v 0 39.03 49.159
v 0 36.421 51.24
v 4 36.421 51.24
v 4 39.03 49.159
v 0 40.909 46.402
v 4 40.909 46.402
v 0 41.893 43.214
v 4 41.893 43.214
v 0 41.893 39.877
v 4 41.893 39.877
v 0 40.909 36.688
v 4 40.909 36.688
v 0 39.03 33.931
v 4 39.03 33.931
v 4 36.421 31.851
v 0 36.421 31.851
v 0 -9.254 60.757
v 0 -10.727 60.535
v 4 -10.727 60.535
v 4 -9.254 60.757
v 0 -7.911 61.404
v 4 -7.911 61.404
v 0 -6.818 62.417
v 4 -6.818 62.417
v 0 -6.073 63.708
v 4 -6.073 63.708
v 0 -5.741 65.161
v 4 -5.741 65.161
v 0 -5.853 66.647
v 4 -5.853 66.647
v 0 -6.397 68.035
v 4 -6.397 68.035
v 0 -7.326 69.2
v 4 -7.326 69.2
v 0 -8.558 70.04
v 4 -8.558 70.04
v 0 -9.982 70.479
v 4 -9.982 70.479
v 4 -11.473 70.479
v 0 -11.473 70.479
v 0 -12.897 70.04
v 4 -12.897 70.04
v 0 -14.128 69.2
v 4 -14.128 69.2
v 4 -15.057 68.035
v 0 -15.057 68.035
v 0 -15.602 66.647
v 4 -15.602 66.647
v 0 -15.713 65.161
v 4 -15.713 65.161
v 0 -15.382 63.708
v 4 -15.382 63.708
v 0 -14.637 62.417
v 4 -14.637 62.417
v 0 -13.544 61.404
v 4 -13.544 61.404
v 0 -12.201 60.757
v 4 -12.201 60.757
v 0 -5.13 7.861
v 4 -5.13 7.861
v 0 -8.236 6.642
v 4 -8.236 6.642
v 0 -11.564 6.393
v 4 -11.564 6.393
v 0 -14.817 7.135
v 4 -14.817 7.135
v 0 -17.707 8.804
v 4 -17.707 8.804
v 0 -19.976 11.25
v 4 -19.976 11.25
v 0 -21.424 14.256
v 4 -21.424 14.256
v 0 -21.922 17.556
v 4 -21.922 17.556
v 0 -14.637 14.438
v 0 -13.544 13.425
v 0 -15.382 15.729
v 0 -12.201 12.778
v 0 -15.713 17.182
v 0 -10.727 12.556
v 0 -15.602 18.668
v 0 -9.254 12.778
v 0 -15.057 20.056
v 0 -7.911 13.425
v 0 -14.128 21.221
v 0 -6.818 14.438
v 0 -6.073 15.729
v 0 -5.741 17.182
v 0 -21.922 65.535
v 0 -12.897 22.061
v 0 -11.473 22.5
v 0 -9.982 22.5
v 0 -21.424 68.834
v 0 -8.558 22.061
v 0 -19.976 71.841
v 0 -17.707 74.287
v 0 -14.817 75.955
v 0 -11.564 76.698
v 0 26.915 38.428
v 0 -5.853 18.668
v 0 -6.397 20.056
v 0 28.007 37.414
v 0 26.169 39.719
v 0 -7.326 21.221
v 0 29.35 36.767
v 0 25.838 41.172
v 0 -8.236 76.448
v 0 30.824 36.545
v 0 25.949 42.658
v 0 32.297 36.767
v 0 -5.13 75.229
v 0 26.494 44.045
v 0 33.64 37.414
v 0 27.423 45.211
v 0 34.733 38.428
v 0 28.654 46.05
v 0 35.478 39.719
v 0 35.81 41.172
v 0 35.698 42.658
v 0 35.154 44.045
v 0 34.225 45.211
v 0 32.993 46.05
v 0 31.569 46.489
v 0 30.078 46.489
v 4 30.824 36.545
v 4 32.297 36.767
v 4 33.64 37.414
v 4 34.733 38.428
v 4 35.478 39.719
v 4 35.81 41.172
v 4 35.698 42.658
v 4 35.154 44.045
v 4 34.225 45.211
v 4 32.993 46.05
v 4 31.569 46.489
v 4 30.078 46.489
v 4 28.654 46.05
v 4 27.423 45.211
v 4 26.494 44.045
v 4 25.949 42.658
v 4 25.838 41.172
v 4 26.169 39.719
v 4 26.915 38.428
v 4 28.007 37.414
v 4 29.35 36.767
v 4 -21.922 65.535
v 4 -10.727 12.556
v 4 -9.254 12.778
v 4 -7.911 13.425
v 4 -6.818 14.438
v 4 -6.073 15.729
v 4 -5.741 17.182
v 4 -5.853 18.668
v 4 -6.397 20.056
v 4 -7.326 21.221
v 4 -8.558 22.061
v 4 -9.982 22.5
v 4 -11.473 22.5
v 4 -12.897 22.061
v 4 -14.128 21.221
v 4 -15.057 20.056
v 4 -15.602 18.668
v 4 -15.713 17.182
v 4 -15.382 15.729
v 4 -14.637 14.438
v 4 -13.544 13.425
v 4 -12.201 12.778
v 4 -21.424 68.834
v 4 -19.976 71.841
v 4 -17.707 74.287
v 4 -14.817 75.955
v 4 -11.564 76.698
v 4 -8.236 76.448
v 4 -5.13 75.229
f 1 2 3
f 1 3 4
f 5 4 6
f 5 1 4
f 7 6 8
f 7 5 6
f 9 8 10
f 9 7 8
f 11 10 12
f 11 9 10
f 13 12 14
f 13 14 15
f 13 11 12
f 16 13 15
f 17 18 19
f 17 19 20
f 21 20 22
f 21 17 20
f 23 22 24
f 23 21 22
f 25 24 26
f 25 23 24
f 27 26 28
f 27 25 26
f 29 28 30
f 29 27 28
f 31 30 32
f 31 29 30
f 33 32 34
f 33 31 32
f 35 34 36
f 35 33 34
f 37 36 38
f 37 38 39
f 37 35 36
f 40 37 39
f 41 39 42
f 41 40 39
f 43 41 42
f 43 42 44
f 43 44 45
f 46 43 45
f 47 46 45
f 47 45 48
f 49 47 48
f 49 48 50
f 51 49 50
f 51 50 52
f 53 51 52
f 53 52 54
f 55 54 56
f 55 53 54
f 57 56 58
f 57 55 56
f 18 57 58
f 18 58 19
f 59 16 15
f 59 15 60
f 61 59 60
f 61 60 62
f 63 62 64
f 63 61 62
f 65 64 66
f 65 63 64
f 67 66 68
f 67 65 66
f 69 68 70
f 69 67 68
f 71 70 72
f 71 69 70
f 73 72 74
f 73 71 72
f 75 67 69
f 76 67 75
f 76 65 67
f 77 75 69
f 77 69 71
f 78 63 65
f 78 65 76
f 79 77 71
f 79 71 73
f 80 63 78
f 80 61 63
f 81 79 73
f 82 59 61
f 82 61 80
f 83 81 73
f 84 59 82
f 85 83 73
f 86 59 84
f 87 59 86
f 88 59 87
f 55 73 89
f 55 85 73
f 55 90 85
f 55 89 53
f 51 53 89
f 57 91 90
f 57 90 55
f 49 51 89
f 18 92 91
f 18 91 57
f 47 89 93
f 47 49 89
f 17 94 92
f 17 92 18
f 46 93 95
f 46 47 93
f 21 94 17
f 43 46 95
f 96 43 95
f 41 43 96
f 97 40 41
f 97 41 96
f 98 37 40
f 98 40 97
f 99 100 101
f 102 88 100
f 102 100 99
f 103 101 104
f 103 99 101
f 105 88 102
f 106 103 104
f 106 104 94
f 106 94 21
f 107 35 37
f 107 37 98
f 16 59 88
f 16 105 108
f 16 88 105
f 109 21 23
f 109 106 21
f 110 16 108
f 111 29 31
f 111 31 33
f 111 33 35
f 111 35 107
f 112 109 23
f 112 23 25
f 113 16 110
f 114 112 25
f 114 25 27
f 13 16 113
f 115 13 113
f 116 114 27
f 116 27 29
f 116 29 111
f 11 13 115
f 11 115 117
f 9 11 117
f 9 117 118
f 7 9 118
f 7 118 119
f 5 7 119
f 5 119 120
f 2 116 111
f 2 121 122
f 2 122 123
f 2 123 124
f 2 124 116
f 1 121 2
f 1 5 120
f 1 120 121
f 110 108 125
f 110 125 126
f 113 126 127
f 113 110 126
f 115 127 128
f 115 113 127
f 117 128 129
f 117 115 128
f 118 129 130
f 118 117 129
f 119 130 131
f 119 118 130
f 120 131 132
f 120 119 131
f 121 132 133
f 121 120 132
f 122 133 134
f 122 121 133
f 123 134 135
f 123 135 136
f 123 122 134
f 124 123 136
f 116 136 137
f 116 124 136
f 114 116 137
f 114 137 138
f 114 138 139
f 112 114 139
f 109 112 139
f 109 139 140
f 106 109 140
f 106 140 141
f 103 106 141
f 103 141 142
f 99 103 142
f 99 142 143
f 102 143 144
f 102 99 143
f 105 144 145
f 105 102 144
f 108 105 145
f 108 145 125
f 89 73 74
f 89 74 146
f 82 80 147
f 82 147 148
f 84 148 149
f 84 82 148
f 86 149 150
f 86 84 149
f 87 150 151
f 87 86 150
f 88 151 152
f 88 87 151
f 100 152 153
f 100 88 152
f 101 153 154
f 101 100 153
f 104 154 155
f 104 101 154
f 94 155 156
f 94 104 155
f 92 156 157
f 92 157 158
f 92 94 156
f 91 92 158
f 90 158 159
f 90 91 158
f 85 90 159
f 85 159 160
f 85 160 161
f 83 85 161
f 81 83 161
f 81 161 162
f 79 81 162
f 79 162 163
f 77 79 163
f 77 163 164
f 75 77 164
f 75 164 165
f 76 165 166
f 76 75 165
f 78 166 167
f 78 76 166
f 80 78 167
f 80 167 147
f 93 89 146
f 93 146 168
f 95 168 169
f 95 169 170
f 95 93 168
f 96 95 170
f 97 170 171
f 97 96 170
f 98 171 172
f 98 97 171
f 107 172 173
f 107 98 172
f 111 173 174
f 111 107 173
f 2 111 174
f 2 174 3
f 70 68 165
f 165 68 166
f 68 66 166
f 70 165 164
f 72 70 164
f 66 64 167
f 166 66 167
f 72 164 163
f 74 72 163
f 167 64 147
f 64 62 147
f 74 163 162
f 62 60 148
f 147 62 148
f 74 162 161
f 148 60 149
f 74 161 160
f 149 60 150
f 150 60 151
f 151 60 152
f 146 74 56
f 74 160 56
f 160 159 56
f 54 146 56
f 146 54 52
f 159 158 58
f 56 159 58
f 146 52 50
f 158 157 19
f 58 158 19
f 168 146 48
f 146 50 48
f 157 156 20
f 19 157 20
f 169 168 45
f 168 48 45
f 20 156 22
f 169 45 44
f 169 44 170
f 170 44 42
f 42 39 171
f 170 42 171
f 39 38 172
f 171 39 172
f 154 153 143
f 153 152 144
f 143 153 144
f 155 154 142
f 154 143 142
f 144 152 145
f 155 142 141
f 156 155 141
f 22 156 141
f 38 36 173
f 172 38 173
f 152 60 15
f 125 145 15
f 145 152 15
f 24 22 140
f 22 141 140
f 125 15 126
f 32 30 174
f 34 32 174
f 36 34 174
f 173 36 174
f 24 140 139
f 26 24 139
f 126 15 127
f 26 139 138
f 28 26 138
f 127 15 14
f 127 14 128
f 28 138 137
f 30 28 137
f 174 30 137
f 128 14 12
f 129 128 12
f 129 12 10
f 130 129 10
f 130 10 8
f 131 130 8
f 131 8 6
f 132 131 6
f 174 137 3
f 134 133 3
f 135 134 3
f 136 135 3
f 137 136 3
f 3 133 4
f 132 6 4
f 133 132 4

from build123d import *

# Parameters (mm, degrees)
SKETCH1_R           = 5
BOSS_EXTRUDE1_DEPTH = 4


with BuildPart() as part:
    # Sketch1 → Boss-Extrude1 (new body)
    with BuildSketch(Plane(origin=(0, 0, 0), x_dir=(0, 0, -1), z_dir=(1, 0, 0))):
        with BuildLine():
            Line((-31.850752253, 36.420784179), (-7.861259629, -5.130235893))
            ThreePointArc((-7.861259629, -5.130235893), (-7.861259629, -16.324481088), (-17.555760345, -21.921603686))
            Line((-17.555760345, -21.921603686), (-65.534745592, -21.921603686))
            ThreePointArc((-65.534745592, -21.921603686), (-75.229246307, -16.324481088), (-75.229246307, -5.130235893))
            Line((-75.229246307, -5.130235893), (-51.239753683, 36.420784179))
            ThreePointArc((-51.239753683, 36.420784179), (-41.545252968, 42.017906776), (-31.850752253, 36.420784179))
        make_face()
        with Locations((-41.545252968, 30.823661581)):
            Circle(SKETCH1_R, mode=Mode.SUBTRACT)
        with Locations((-17.555760345, -10.727358491)):
            Circle(SKETCH1_R, mode=Mode.SUBTRACT)
        with Locations((-65.534745592, -10.727358491)):
            Circle(SKETCH1_R, mode=Mode.SUBTRACT)
    extrude(amount=BOSS_EXTRUDE1_DEPTH)


solid = part.part
